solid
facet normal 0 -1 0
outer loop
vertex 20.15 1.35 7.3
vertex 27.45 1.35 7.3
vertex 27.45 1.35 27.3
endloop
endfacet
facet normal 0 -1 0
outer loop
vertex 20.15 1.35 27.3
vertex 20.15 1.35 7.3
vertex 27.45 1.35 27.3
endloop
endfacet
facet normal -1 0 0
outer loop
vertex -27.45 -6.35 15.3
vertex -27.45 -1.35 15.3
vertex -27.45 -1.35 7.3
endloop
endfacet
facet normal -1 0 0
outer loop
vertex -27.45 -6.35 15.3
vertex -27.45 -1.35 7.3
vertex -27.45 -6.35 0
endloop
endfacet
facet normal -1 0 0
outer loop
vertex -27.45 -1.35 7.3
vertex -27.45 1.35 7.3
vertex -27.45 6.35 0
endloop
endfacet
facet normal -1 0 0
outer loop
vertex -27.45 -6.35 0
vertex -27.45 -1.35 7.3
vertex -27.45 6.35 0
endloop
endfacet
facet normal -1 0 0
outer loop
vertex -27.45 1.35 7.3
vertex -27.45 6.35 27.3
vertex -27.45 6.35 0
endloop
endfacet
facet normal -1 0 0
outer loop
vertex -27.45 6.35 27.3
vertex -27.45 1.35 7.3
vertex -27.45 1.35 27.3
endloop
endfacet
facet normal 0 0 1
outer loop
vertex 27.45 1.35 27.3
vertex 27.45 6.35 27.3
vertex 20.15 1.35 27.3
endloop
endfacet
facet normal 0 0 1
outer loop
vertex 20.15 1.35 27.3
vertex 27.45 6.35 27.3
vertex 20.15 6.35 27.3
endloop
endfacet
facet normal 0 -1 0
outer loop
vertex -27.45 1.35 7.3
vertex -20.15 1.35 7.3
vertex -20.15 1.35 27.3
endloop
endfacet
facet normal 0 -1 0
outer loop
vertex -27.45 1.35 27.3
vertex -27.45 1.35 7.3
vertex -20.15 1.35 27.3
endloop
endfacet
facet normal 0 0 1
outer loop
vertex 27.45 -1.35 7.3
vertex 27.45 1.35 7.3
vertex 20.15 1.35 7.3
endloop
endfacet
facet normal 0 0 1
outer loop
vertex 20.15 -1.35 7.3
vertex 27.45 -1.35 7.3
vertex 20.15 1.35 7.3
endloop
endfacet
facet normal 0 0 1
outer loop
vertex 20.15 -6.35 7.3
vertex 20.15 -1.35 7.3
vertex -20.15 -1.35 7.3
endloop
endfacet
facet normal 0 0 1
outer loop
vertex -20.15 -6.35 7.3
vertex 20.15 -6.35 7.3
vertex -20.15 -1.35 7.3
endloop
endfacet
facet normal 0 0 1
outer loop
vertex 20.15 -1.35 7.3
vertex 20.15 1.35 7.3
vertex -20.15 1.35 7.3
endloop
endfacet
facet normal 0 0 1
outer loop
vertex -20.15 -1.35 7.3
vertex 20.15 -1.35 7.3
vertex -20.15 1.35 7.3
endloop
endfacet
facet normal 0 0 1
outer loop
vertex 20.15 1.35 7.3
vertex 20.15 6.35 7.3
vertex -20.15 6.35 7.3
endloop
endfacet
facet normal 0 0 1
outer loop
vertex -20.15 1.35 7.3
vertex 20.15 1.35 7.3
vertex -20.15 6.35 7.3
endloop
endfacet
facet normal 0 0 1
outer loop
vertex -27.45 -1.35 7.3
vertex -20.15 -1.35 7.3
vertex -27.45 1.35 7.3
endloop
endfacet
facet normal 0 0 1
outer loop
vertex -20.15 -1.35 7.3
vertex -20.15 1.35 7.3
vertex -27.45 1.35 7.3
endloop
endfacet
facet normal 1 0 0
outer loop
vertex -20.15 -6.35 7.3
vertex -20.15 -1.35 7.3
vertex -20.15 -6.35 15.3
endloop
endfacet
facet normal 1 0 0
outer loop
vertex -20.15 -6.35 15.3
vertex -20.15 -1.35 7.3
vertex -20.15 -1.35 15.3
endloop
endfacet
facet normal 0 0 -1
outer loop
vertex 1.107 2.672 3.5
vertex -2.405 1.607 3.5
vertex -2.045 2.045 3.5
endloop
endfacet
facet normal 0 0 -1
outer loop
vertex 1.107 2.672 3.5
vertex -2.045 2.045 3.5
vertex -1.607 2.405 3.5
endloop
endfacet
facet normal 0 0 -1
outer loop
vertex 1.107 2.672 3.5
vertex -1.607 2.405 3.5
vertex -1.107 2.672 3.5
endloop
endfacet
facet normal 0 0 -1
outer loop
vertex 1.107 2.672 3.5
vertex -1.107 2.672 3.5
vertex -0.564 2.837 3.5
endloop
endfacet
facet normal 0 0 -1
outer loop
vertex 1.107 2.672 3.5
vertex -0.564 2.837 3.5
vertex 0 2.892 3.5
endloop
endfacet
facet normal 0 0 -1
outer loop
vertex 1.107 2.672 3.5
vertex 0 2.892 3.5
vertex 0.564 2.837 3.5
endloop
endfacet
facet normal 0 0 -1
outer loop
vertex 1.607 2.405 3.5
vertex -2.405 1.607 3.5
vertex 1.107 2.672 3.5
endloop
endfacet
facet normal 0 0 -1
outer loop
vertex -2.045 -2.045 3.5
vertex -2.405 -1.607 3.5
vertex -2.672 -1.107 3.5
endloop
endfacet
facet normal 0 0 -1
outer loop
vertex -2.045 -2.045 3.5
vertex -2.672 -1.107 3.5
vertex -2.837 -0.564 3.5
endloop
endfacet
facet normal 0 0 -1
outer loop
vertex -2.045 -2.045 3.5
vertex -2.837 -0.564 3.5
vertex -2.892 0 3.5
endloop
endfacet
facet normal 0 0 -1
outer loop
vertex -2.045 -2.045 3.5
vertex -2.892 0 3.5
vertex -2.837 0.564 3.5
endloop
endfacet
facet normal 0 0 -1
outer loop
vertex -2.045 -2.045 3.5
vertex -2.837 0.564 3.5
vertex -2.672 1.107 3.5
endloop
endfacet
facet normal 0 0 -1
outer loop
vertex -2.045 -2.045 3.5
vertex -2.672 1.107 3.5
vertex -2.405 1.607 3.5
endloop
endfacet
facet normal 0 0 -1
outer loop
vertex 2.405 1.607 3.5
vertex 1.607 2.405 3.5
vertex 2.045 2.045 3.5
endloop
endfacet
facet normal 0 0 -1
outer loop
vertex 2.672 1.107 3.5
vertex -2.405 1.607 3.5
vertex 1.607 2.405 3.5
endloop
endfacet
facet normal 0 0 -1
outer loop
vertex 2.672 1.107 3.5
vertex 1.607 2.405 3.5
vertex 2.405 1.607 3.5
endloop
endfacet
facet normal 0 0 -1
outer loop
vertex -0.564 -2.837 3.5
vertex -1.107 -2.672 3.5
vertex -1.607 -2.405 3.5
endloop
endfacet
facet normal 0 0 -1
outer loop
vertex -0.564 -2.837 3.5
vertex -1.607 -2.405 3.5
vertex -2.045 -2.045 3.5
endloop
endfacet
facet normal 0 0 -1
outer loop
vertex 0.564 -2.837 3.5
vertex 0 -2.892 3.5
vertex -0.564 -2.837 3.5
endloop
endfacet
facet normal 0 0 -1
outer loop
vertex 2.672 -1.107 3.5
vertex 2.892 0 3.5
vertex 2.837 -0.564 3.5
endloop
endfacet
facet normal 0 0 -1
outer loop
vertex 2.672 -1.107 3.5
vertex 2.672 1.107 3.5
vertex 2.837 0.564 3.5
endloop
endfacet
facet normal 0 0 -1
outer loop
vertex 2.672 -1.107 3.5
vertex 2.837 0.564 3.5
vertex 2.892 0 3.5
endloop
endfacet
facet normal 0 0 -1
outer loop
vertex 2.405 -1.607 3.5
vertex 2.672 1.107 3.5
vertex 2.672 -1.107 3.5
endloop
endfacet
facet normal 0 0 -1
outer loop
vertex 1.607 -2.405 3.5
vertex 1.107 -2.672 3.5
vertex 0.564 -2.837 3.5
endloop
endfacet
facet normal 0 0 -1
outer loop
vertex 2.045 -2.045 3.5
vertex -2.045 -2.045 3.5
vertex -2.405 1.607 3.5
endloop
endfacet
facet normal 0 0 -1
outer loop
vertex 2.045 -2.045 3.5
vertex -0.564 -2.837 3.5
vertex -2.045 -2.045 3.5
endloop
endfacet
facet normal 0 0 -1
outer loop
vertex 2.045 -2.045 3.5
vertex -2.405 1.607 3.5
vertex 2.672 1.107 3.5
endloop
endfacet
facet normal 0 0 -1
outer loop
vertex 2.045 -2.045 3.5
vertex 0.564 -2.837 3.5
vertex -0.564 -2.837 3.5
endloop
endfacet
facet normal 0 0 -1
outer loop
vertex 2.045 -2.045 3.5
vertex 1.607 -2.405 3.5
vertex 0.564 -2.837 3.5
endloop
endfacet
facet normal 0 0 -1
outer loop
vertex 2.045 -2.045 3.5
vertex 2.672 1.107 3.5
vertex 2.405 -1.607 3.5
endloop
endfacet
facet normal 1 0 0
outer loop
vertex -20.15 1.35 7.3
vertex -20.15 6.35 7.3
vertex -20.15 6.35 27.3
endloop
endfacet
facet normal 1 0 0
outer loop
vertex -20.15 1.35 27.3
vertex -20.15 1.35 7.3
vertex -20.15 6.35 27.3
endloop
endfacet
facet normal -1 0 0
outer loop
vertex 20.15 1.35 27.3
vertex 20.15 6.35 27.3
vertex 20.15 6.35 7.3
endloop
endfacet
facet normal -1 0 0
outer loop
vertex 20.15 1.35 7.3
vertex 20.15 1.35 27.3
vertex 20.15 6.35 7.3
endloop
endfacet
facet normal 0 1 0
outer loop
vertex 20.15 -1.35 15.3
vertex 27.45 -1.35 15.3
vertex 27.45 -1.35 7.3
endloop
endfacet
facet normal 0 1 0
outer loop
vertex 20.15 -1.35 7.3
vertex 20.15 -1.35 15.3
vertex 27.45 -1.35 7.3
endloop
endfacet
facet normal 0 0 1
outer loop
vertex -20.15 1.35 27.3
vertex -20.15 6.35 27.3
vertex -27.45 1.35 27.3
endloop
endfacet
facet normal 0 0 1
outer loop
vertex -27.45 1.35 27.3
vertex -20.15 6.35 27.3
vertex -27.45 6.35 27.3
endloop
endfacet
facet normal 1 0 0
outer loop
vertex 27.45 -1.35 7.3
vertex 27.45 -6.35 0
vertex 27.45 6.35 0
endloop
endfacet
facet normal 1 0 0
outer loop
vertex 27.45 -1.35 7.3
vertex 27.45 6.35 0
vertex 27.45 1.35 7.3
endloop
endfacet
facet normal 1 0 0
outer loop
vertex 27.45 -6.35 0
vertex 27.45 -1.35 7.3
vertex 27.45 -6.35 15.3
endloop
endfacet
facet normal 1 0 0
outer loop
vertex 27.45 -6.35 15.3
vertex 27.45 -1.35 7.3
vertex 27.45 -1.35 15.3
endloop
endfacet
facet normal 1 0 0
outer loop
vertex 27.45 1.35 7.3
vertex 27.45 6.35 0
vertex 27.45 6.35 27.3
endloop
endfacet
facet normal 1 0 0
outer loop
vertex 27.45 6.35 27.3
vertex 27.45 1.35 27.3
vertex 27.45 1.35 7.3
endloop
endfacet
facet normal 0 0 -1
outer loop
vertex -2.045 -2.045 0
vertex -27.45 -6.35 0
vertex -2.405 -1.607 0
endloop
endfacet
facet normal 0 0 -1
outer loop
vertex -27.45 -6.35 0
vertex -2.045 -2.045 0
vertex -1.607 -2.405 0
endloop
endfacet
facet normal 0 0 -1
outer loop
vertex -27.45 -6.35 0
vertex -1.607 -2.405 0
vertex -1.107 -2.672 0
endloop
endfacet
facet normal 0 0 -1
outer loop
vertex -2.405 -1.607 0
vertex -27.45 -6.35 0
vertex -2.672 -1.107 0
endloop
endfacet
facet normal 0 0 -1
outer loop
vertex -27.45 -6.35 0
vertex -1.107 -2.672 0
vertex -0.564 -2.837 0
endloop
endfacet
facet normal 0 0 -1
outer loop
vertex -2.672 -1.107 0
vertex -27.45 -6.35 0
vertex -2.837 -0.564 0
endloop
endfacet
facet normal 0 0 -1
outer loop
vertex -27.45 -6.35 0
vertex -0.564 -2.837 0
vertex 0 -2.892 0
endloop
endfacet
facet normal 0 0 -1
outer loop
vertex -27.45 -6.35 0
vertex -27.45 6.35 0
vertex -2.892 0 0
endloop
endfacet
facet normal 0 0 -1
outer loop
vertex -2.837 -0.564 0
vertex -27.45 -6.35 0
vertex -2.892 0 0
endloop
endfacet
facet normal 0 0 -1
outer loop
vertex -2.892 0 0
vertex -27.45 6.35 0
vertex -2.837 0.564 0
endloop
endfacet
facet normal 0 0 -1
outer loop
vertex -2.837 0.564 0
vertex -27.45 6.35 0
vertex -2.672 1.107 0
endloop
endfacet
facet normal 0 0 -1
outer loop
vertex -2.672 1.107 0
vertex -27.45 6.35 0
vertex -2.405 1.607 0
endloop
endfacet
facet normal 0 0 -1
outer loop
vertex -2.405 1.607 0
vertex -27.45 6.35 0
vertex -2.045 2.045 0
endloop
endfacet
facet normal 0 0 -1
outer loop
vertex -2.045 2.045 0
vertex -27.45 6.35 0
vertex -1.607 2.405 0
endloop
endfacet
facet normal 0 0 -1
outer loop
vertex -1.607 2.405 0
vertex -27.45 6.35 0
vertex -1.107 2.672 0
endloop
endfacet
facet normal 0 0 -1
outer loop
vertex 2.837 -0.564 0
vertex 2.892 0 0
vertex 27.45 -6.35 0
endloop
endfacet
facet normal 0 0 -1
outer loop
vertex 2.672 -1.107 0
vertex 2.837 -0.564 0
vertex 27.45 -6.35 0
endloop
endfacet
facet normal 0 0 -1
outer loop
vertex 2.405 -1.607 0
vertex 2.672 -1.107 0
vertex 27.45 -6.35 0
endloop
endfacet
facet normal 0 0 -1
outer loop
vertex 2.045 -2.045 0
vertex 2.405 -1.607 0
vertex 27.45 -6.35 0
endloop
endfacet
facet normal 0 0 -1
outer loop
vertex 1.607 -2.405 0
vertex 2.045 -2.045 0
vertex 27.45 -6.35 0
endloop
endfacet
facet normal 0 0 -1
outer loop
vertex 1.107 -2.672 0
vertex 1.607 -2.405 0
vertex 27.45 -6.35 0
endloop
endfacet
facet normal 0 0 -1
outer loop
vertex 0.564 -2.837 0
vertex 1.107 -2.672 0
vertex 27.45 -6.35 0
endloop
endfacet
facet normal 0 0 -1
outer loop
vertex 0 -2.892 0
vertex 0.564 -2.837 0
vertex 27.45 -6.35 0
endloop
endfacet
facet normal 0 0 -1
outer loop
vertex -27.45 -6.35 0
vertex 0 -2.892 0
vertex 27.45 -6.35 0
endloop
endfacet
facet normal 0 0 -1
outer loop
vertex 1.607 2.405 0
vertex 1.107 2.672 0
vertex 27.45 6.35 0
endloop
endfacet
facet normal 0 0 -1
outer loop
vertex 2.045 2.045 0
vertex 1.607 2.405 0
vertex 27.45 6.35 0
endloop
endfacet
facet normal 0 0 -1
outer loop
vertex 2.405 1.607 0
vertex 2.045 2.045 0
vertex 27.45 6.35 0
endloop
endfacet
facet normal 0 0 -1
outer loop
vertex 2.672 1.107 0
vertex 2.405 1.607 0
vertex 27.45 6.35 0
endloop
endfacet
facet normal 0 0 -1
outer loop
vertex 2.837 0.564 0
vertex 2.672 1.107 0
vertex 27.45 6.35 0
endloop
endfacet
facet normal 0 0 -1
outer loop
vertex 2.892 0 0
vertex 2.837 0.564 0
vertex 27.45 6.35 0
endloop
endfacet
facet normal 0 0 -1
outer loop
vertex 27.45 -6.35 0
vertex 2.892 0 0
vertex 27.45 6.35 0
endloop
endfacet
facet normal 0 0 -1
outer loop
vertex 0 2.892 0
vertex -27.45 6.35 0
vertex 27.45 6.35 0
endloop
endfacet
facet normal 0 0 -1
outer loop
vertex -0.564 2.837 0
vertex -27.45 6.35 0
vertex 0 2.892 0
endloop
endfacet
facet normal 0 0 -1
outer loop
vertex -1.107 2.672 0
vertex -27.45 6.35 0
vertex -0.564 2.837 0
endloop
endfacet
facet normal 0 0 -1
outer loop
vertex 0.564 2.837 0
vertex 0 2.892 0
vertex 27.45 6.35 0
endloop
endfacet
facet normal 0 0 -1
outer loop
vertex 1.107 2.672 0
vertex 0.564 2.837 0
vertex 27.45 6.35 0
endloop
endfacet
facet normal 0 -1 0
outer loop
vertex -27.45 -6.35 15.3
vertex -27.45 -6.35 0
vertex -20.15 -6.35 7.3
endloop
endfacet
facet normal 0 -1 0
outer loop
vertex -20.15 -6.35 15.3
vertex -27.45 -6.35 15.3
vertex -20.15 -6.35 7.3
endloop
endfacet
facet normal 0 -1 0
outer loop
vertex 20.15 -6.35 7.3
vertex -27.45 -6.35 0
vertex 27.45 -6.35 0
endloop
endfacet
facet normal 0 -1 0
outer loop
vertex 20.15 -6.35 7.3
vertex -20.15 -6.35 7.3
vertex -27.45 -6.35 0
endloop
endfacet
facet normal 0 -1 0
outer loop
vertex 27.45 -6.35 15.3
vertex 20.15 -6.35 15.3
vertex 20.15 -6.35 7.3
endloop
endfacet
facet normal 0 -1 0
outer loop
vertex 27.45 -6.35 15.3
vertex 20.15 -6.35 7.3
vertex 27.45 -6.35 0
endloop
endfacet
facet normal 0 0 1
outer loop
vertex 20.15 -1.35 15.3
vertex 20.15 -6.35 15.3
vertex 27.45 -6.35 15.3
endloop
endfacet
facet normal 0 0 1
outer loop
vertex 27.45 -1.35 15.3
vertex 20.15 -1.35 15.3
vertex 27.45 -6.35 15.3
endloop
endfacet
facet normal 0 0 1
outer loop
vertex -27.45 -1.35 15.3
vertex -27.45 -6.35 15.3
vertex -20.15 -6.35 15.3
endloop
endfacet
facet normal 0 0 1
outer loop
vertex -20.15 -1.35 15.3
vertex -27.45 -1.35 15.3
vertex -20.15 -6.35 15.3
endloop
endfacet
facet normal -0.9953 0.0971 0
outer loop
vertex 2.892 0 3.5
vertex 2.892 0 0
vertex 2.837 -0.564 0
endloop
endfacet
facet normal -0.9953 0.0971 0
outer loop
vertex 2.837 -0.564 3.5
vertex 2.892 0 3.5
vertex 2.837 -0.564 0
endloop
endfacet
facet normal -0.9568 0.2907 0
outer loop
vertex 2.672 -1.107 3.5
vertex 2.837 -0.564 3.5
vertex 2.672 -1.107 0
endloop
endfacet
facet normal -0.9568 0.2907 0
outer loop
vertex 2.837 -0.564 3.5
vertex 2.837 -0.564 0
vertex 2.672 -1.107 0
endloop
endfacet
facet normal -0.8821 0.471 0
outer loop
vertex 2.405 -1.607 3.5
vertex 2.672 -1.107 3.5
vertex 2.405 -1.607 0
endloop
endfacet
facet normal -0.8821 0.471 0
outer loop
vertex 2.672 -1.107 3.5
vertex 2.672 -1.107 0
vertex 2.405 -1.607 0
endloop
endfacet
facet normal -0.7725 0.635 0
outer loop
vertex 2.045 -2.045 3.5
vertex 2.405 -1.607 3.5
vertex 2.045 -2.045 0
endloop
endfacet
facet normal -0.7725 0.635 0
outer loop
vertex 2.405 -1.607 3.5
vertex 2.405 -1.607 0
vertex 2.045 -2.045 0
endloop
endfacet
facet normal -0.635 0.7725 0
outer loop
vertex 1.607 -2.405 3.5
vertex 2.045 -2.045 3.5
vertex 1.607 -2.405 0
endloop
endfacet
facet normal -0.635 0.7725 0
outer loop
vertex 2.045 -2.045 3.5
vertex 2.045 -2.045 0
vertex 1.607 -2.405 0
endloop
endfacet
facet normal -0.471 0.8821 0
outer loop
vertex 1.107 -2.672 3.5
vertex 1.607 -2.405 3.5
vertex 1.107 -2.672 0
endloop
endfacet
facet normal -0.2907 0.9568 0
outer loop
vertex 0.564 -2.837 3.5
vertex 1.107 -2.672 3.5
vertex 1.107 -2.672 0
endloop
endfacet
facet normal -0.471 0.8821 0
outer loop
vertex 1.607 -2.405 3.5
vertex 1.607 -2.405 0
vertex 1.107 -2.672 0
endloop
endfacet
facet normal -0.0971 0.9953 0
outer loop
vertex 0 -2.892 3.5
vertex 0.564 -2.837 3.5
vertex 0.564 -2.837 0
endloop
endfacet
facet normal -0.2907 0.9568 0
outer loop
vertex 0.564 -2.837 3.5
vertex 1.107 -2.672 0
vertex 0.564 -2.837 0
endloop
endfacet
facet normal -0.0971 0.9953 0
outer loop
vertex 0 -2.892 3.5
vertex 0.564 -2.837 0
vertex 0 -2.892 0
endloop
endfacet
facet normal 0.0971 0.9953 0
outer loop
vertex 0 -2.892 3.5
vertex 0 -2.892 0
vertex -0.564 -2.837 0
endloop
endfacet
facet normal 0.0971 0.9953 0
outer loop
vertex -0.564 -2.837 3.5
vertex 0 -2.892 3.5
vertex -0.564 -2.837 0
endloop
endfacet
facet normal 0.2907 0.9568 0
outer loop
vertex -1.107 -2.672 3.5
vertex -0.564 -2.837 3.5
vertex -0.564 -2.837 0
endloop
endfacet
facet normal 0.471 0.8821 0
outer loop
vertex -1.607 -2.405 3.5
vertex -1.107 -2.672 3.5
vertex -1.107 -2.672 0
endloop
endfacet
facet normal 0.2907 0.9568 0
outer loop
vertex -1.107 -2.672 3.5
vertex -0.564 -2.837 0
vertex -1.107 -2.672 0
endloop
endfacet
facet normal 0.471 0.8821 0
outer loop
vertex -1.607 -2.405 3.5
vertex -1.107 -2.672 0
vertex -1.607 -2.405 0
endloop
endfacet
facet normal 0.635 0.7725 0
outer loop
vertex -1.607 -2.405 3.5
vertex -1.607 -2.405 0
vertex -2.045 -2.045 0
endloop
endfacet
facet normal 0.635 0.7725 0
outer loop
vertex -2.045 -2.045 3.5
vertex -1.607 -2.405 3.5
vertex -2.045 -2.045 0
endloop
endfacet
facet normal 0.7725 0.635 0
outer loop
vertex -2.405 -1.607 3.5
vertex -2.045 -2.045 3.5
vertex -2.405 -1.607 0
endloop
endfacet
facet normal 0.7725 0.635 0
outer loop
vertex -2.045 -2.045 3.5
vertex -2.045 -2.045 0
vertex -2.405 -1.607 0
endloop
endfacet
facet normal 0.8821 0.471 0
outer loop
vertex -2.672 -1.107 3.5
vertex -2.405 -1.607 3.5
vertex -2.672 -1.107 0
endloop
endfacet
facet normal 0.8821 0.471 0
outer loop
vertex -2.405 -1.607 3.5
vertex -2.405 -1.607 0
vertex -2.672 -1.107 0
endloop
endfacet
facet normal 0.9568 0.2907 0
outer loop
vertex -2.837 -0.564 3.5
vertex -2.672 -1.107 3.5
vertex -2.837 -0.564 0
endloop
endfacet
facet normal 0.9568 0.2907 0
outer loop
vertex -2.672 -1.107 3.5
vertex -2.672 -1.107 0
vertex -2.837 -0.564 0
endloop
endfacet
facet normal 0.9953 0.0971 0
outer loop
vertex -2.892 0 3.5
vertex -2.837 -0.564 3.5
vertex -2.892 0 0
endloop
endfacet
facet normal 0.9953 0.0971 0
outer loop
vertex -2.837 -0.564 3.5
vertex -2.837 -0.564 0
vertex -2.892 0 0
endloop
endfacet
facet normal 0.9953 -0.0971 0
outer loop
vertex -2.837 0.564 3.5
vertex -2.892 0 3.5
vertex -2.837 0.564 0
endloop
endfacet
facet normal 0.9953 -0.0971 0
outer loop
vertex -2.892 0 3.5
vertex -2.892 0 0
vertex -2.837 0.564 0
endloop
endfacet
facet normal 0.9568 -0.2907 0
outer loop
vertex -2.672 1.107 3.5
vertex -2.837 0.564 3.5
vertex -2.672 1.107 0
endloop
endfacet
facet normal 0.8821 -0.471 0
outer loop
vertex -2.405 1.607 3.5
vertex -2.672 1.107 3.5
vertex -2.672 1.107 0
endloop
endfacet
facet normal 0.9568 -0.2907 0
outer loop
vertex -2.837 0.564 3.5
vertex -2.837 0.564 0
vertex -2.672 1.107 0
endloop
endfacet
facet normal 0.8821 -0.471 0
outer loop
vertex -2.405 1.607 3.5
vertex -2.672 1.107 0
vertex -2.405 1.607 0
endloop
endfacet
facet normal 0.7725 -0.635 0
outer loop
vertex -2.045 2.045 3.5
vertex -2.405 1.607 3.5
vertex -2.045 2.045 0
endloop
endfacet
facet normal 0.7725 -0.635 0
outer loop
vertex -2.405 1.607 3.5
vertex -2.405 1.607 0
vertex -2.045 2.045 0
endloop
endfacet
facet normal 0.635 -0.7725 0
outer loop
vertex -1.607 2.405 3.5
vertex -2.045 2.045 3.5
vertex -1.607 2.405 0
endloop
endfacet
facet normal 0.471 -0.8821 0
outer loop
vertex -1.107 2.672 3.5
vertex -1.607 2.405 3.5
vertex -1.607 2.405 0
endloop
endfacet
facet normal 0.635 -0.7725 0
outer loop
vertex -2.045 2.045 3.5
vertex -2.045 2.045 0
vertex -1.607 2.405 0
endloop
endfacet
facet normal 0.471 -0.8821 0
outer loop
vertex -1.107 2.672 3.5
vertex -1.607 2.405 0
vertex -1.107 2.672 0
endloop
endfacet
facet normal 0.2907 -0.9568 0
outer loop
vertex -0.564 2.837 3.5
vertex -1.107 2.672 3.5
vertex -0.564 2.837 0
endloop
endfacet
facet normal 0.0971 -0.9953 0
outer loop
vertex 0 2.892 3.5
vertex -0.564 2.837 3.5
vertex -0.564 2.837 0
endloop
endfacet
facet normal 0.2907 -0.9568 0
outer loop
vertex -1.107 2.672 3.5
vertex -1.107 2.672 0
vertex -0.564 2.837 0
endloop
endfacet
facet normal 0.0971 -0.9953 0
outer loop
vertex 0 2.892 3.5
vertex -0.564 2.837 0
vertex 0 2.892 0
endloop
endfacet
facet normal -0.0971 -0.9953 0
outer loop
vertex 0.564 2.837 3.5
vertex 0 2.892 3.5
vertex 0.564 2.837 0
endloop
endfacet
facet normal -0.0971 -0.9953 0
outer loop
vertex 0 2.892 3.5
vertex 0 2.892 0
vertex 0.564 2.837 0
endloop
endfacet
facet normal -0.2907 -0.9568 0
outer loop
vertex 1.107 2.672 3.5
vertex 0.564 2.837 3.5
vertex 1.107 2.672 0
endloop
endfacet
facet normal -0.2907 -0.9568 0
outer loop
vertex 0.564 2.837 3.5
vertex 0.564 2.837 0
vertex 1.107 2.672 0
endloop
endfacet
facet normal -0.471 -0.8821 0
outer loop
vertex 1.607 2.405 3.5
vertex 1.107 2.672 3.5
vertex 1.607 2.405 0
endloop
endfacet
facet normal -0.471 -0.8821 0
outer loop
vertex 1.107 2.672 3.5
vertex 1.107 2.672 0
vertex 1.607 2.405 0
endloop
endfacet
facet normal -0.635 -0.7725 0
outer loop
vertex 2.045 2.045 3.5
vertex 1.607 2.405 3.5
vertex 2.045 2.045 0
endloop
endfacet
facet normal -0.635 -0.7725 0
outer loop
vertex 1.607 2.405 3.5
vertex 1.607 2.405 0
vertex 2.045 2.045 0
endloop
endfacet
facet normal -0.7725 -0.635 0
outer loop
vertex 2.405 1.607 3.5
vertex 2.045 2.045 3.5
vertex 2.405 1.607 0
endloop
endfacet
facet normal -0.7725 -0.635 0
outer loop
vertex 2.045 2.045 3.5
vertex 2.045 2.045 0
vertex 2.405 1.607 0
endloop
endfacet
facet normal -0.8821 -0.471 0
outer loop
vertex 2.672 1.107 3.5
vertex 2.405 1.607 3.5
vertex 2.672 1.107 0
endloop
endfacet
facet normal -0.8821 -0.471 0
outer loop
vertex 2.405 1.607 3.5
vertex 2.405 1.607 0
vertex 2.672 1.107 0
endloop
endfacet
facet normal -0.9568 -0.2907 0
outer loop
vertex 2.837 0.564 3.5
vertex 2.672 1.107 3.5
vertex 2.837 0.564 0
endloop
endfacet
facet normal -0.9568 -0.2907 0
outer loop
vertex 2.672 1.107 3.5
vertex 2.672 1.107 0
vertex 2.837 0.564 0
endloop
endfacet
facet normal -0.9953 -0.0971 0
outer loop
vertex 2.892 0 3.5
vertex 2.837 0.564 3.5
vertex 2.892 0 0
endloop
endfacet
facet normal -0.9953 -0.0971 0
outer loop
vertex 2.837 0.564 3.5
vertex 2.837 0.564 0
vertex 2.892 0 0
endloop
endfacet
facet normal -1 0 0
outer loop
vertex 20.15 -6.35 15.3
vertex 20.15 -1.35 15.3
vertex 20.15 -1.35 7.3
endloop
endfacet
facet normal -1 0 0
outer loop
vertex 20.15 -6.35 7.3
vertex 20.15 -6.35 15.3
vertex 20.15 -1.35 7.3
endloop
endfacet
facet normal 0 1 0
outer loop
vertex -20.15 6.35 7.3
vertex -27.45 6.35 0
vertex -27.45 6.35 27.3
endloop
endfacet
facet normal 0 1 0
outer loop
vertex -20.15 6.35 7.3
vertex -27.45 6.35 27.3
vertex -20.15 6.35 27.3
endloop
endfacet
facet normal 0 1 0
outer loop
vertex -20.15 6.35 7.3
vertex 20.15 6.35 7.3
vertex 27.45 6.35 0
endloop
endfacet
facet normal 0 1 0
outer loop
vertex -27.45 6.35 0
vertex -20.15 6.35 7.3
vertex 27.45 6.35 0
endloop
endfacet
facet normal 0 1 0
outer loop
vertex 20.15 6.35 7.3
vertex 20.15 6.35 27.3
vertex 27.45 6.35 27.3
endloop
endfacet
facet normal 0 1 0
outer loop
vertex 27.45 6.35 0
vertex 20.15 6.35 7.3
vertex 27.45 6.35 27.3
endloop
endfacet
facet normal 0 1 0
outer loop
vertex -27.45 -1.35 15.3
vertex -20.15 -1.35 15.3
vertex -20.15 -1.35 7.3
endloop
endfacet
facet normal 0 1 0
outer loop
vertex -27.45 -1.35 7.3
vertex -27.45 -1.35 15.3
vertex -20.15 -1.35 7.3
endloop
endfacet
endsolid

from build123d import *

# Parameters (mm, degrees)
F1_DEPTH = 12.7
F2_ANGLE = 270
F3_W     = 7.3
F3_H     = 12
F4_DEPTH = 7.2
F6_DEPTH = 54.9
F7_R     = 2.8925
F8_DEPTH = 3.5


with BuildPart() as f1:
    # F0 (on Top) → F1 (new body)
    with BuildSketch(Plane.XY):
        Polygon((20.15, 10), (20.15, 0), (20.15, -10), (-20.15, -10), (-20.15, 0), (-20.15, 10), (-27.45, 10), (-27.45, -10), (-27.45, -17.3), (27.45, -17.3), (27.45, -10), (27.45, 10), align=None)
    extrude(amount=F1_DEPTH)


with BuildPart() as f1_1:
    # F2: moved
    add(f1.part.rotate(Axis((0, -17.3, 12.7), (-1, 0, 0)), F2_ANGLE))

    # F3 (on face) → F4 (cut)
    with BuildSketch(Plane.XZ.offset(17.3)):
        with Locations((23.8, 34)):
            Rectangle(F3_W, F3_H)
        with Locations((-23.8, 34)):
            Rectangle(F3_W, F3_H)
    extrude(amount=-F4_DEPTH, mode=Mode.SUBTRACT)

    # F5 (on face) → F6 (cut)
    with BuildSketch(Plane.YZ.offset(27.45)):
        Polygon((-12.3, 40), (-12.3, 28), (-12.3, 20), (-9.6, 20), (-9.6, 40), align=None)
    extrude(amount=-F6_DEPTH, mode=Mode.SUBTRACT)

    # F7 (on face) → F8 (cut)
    with BuildSketch(Plane(origin=(0, 0, 12.7), x_dir=(1, 0, 0), z_dir=(0, 0, -1))):
        with Locations((0, 10.95)):
            Circle(F7_R)
    extrude(amount=-F8_DEPTH, mode=Mode.SUBTRACT)


with BuildPart() as f1_2:
    # F9: moved
    add(f1_1.part.moved(Location((0, 10.95, -12.7))))


solid = f1_2.part
